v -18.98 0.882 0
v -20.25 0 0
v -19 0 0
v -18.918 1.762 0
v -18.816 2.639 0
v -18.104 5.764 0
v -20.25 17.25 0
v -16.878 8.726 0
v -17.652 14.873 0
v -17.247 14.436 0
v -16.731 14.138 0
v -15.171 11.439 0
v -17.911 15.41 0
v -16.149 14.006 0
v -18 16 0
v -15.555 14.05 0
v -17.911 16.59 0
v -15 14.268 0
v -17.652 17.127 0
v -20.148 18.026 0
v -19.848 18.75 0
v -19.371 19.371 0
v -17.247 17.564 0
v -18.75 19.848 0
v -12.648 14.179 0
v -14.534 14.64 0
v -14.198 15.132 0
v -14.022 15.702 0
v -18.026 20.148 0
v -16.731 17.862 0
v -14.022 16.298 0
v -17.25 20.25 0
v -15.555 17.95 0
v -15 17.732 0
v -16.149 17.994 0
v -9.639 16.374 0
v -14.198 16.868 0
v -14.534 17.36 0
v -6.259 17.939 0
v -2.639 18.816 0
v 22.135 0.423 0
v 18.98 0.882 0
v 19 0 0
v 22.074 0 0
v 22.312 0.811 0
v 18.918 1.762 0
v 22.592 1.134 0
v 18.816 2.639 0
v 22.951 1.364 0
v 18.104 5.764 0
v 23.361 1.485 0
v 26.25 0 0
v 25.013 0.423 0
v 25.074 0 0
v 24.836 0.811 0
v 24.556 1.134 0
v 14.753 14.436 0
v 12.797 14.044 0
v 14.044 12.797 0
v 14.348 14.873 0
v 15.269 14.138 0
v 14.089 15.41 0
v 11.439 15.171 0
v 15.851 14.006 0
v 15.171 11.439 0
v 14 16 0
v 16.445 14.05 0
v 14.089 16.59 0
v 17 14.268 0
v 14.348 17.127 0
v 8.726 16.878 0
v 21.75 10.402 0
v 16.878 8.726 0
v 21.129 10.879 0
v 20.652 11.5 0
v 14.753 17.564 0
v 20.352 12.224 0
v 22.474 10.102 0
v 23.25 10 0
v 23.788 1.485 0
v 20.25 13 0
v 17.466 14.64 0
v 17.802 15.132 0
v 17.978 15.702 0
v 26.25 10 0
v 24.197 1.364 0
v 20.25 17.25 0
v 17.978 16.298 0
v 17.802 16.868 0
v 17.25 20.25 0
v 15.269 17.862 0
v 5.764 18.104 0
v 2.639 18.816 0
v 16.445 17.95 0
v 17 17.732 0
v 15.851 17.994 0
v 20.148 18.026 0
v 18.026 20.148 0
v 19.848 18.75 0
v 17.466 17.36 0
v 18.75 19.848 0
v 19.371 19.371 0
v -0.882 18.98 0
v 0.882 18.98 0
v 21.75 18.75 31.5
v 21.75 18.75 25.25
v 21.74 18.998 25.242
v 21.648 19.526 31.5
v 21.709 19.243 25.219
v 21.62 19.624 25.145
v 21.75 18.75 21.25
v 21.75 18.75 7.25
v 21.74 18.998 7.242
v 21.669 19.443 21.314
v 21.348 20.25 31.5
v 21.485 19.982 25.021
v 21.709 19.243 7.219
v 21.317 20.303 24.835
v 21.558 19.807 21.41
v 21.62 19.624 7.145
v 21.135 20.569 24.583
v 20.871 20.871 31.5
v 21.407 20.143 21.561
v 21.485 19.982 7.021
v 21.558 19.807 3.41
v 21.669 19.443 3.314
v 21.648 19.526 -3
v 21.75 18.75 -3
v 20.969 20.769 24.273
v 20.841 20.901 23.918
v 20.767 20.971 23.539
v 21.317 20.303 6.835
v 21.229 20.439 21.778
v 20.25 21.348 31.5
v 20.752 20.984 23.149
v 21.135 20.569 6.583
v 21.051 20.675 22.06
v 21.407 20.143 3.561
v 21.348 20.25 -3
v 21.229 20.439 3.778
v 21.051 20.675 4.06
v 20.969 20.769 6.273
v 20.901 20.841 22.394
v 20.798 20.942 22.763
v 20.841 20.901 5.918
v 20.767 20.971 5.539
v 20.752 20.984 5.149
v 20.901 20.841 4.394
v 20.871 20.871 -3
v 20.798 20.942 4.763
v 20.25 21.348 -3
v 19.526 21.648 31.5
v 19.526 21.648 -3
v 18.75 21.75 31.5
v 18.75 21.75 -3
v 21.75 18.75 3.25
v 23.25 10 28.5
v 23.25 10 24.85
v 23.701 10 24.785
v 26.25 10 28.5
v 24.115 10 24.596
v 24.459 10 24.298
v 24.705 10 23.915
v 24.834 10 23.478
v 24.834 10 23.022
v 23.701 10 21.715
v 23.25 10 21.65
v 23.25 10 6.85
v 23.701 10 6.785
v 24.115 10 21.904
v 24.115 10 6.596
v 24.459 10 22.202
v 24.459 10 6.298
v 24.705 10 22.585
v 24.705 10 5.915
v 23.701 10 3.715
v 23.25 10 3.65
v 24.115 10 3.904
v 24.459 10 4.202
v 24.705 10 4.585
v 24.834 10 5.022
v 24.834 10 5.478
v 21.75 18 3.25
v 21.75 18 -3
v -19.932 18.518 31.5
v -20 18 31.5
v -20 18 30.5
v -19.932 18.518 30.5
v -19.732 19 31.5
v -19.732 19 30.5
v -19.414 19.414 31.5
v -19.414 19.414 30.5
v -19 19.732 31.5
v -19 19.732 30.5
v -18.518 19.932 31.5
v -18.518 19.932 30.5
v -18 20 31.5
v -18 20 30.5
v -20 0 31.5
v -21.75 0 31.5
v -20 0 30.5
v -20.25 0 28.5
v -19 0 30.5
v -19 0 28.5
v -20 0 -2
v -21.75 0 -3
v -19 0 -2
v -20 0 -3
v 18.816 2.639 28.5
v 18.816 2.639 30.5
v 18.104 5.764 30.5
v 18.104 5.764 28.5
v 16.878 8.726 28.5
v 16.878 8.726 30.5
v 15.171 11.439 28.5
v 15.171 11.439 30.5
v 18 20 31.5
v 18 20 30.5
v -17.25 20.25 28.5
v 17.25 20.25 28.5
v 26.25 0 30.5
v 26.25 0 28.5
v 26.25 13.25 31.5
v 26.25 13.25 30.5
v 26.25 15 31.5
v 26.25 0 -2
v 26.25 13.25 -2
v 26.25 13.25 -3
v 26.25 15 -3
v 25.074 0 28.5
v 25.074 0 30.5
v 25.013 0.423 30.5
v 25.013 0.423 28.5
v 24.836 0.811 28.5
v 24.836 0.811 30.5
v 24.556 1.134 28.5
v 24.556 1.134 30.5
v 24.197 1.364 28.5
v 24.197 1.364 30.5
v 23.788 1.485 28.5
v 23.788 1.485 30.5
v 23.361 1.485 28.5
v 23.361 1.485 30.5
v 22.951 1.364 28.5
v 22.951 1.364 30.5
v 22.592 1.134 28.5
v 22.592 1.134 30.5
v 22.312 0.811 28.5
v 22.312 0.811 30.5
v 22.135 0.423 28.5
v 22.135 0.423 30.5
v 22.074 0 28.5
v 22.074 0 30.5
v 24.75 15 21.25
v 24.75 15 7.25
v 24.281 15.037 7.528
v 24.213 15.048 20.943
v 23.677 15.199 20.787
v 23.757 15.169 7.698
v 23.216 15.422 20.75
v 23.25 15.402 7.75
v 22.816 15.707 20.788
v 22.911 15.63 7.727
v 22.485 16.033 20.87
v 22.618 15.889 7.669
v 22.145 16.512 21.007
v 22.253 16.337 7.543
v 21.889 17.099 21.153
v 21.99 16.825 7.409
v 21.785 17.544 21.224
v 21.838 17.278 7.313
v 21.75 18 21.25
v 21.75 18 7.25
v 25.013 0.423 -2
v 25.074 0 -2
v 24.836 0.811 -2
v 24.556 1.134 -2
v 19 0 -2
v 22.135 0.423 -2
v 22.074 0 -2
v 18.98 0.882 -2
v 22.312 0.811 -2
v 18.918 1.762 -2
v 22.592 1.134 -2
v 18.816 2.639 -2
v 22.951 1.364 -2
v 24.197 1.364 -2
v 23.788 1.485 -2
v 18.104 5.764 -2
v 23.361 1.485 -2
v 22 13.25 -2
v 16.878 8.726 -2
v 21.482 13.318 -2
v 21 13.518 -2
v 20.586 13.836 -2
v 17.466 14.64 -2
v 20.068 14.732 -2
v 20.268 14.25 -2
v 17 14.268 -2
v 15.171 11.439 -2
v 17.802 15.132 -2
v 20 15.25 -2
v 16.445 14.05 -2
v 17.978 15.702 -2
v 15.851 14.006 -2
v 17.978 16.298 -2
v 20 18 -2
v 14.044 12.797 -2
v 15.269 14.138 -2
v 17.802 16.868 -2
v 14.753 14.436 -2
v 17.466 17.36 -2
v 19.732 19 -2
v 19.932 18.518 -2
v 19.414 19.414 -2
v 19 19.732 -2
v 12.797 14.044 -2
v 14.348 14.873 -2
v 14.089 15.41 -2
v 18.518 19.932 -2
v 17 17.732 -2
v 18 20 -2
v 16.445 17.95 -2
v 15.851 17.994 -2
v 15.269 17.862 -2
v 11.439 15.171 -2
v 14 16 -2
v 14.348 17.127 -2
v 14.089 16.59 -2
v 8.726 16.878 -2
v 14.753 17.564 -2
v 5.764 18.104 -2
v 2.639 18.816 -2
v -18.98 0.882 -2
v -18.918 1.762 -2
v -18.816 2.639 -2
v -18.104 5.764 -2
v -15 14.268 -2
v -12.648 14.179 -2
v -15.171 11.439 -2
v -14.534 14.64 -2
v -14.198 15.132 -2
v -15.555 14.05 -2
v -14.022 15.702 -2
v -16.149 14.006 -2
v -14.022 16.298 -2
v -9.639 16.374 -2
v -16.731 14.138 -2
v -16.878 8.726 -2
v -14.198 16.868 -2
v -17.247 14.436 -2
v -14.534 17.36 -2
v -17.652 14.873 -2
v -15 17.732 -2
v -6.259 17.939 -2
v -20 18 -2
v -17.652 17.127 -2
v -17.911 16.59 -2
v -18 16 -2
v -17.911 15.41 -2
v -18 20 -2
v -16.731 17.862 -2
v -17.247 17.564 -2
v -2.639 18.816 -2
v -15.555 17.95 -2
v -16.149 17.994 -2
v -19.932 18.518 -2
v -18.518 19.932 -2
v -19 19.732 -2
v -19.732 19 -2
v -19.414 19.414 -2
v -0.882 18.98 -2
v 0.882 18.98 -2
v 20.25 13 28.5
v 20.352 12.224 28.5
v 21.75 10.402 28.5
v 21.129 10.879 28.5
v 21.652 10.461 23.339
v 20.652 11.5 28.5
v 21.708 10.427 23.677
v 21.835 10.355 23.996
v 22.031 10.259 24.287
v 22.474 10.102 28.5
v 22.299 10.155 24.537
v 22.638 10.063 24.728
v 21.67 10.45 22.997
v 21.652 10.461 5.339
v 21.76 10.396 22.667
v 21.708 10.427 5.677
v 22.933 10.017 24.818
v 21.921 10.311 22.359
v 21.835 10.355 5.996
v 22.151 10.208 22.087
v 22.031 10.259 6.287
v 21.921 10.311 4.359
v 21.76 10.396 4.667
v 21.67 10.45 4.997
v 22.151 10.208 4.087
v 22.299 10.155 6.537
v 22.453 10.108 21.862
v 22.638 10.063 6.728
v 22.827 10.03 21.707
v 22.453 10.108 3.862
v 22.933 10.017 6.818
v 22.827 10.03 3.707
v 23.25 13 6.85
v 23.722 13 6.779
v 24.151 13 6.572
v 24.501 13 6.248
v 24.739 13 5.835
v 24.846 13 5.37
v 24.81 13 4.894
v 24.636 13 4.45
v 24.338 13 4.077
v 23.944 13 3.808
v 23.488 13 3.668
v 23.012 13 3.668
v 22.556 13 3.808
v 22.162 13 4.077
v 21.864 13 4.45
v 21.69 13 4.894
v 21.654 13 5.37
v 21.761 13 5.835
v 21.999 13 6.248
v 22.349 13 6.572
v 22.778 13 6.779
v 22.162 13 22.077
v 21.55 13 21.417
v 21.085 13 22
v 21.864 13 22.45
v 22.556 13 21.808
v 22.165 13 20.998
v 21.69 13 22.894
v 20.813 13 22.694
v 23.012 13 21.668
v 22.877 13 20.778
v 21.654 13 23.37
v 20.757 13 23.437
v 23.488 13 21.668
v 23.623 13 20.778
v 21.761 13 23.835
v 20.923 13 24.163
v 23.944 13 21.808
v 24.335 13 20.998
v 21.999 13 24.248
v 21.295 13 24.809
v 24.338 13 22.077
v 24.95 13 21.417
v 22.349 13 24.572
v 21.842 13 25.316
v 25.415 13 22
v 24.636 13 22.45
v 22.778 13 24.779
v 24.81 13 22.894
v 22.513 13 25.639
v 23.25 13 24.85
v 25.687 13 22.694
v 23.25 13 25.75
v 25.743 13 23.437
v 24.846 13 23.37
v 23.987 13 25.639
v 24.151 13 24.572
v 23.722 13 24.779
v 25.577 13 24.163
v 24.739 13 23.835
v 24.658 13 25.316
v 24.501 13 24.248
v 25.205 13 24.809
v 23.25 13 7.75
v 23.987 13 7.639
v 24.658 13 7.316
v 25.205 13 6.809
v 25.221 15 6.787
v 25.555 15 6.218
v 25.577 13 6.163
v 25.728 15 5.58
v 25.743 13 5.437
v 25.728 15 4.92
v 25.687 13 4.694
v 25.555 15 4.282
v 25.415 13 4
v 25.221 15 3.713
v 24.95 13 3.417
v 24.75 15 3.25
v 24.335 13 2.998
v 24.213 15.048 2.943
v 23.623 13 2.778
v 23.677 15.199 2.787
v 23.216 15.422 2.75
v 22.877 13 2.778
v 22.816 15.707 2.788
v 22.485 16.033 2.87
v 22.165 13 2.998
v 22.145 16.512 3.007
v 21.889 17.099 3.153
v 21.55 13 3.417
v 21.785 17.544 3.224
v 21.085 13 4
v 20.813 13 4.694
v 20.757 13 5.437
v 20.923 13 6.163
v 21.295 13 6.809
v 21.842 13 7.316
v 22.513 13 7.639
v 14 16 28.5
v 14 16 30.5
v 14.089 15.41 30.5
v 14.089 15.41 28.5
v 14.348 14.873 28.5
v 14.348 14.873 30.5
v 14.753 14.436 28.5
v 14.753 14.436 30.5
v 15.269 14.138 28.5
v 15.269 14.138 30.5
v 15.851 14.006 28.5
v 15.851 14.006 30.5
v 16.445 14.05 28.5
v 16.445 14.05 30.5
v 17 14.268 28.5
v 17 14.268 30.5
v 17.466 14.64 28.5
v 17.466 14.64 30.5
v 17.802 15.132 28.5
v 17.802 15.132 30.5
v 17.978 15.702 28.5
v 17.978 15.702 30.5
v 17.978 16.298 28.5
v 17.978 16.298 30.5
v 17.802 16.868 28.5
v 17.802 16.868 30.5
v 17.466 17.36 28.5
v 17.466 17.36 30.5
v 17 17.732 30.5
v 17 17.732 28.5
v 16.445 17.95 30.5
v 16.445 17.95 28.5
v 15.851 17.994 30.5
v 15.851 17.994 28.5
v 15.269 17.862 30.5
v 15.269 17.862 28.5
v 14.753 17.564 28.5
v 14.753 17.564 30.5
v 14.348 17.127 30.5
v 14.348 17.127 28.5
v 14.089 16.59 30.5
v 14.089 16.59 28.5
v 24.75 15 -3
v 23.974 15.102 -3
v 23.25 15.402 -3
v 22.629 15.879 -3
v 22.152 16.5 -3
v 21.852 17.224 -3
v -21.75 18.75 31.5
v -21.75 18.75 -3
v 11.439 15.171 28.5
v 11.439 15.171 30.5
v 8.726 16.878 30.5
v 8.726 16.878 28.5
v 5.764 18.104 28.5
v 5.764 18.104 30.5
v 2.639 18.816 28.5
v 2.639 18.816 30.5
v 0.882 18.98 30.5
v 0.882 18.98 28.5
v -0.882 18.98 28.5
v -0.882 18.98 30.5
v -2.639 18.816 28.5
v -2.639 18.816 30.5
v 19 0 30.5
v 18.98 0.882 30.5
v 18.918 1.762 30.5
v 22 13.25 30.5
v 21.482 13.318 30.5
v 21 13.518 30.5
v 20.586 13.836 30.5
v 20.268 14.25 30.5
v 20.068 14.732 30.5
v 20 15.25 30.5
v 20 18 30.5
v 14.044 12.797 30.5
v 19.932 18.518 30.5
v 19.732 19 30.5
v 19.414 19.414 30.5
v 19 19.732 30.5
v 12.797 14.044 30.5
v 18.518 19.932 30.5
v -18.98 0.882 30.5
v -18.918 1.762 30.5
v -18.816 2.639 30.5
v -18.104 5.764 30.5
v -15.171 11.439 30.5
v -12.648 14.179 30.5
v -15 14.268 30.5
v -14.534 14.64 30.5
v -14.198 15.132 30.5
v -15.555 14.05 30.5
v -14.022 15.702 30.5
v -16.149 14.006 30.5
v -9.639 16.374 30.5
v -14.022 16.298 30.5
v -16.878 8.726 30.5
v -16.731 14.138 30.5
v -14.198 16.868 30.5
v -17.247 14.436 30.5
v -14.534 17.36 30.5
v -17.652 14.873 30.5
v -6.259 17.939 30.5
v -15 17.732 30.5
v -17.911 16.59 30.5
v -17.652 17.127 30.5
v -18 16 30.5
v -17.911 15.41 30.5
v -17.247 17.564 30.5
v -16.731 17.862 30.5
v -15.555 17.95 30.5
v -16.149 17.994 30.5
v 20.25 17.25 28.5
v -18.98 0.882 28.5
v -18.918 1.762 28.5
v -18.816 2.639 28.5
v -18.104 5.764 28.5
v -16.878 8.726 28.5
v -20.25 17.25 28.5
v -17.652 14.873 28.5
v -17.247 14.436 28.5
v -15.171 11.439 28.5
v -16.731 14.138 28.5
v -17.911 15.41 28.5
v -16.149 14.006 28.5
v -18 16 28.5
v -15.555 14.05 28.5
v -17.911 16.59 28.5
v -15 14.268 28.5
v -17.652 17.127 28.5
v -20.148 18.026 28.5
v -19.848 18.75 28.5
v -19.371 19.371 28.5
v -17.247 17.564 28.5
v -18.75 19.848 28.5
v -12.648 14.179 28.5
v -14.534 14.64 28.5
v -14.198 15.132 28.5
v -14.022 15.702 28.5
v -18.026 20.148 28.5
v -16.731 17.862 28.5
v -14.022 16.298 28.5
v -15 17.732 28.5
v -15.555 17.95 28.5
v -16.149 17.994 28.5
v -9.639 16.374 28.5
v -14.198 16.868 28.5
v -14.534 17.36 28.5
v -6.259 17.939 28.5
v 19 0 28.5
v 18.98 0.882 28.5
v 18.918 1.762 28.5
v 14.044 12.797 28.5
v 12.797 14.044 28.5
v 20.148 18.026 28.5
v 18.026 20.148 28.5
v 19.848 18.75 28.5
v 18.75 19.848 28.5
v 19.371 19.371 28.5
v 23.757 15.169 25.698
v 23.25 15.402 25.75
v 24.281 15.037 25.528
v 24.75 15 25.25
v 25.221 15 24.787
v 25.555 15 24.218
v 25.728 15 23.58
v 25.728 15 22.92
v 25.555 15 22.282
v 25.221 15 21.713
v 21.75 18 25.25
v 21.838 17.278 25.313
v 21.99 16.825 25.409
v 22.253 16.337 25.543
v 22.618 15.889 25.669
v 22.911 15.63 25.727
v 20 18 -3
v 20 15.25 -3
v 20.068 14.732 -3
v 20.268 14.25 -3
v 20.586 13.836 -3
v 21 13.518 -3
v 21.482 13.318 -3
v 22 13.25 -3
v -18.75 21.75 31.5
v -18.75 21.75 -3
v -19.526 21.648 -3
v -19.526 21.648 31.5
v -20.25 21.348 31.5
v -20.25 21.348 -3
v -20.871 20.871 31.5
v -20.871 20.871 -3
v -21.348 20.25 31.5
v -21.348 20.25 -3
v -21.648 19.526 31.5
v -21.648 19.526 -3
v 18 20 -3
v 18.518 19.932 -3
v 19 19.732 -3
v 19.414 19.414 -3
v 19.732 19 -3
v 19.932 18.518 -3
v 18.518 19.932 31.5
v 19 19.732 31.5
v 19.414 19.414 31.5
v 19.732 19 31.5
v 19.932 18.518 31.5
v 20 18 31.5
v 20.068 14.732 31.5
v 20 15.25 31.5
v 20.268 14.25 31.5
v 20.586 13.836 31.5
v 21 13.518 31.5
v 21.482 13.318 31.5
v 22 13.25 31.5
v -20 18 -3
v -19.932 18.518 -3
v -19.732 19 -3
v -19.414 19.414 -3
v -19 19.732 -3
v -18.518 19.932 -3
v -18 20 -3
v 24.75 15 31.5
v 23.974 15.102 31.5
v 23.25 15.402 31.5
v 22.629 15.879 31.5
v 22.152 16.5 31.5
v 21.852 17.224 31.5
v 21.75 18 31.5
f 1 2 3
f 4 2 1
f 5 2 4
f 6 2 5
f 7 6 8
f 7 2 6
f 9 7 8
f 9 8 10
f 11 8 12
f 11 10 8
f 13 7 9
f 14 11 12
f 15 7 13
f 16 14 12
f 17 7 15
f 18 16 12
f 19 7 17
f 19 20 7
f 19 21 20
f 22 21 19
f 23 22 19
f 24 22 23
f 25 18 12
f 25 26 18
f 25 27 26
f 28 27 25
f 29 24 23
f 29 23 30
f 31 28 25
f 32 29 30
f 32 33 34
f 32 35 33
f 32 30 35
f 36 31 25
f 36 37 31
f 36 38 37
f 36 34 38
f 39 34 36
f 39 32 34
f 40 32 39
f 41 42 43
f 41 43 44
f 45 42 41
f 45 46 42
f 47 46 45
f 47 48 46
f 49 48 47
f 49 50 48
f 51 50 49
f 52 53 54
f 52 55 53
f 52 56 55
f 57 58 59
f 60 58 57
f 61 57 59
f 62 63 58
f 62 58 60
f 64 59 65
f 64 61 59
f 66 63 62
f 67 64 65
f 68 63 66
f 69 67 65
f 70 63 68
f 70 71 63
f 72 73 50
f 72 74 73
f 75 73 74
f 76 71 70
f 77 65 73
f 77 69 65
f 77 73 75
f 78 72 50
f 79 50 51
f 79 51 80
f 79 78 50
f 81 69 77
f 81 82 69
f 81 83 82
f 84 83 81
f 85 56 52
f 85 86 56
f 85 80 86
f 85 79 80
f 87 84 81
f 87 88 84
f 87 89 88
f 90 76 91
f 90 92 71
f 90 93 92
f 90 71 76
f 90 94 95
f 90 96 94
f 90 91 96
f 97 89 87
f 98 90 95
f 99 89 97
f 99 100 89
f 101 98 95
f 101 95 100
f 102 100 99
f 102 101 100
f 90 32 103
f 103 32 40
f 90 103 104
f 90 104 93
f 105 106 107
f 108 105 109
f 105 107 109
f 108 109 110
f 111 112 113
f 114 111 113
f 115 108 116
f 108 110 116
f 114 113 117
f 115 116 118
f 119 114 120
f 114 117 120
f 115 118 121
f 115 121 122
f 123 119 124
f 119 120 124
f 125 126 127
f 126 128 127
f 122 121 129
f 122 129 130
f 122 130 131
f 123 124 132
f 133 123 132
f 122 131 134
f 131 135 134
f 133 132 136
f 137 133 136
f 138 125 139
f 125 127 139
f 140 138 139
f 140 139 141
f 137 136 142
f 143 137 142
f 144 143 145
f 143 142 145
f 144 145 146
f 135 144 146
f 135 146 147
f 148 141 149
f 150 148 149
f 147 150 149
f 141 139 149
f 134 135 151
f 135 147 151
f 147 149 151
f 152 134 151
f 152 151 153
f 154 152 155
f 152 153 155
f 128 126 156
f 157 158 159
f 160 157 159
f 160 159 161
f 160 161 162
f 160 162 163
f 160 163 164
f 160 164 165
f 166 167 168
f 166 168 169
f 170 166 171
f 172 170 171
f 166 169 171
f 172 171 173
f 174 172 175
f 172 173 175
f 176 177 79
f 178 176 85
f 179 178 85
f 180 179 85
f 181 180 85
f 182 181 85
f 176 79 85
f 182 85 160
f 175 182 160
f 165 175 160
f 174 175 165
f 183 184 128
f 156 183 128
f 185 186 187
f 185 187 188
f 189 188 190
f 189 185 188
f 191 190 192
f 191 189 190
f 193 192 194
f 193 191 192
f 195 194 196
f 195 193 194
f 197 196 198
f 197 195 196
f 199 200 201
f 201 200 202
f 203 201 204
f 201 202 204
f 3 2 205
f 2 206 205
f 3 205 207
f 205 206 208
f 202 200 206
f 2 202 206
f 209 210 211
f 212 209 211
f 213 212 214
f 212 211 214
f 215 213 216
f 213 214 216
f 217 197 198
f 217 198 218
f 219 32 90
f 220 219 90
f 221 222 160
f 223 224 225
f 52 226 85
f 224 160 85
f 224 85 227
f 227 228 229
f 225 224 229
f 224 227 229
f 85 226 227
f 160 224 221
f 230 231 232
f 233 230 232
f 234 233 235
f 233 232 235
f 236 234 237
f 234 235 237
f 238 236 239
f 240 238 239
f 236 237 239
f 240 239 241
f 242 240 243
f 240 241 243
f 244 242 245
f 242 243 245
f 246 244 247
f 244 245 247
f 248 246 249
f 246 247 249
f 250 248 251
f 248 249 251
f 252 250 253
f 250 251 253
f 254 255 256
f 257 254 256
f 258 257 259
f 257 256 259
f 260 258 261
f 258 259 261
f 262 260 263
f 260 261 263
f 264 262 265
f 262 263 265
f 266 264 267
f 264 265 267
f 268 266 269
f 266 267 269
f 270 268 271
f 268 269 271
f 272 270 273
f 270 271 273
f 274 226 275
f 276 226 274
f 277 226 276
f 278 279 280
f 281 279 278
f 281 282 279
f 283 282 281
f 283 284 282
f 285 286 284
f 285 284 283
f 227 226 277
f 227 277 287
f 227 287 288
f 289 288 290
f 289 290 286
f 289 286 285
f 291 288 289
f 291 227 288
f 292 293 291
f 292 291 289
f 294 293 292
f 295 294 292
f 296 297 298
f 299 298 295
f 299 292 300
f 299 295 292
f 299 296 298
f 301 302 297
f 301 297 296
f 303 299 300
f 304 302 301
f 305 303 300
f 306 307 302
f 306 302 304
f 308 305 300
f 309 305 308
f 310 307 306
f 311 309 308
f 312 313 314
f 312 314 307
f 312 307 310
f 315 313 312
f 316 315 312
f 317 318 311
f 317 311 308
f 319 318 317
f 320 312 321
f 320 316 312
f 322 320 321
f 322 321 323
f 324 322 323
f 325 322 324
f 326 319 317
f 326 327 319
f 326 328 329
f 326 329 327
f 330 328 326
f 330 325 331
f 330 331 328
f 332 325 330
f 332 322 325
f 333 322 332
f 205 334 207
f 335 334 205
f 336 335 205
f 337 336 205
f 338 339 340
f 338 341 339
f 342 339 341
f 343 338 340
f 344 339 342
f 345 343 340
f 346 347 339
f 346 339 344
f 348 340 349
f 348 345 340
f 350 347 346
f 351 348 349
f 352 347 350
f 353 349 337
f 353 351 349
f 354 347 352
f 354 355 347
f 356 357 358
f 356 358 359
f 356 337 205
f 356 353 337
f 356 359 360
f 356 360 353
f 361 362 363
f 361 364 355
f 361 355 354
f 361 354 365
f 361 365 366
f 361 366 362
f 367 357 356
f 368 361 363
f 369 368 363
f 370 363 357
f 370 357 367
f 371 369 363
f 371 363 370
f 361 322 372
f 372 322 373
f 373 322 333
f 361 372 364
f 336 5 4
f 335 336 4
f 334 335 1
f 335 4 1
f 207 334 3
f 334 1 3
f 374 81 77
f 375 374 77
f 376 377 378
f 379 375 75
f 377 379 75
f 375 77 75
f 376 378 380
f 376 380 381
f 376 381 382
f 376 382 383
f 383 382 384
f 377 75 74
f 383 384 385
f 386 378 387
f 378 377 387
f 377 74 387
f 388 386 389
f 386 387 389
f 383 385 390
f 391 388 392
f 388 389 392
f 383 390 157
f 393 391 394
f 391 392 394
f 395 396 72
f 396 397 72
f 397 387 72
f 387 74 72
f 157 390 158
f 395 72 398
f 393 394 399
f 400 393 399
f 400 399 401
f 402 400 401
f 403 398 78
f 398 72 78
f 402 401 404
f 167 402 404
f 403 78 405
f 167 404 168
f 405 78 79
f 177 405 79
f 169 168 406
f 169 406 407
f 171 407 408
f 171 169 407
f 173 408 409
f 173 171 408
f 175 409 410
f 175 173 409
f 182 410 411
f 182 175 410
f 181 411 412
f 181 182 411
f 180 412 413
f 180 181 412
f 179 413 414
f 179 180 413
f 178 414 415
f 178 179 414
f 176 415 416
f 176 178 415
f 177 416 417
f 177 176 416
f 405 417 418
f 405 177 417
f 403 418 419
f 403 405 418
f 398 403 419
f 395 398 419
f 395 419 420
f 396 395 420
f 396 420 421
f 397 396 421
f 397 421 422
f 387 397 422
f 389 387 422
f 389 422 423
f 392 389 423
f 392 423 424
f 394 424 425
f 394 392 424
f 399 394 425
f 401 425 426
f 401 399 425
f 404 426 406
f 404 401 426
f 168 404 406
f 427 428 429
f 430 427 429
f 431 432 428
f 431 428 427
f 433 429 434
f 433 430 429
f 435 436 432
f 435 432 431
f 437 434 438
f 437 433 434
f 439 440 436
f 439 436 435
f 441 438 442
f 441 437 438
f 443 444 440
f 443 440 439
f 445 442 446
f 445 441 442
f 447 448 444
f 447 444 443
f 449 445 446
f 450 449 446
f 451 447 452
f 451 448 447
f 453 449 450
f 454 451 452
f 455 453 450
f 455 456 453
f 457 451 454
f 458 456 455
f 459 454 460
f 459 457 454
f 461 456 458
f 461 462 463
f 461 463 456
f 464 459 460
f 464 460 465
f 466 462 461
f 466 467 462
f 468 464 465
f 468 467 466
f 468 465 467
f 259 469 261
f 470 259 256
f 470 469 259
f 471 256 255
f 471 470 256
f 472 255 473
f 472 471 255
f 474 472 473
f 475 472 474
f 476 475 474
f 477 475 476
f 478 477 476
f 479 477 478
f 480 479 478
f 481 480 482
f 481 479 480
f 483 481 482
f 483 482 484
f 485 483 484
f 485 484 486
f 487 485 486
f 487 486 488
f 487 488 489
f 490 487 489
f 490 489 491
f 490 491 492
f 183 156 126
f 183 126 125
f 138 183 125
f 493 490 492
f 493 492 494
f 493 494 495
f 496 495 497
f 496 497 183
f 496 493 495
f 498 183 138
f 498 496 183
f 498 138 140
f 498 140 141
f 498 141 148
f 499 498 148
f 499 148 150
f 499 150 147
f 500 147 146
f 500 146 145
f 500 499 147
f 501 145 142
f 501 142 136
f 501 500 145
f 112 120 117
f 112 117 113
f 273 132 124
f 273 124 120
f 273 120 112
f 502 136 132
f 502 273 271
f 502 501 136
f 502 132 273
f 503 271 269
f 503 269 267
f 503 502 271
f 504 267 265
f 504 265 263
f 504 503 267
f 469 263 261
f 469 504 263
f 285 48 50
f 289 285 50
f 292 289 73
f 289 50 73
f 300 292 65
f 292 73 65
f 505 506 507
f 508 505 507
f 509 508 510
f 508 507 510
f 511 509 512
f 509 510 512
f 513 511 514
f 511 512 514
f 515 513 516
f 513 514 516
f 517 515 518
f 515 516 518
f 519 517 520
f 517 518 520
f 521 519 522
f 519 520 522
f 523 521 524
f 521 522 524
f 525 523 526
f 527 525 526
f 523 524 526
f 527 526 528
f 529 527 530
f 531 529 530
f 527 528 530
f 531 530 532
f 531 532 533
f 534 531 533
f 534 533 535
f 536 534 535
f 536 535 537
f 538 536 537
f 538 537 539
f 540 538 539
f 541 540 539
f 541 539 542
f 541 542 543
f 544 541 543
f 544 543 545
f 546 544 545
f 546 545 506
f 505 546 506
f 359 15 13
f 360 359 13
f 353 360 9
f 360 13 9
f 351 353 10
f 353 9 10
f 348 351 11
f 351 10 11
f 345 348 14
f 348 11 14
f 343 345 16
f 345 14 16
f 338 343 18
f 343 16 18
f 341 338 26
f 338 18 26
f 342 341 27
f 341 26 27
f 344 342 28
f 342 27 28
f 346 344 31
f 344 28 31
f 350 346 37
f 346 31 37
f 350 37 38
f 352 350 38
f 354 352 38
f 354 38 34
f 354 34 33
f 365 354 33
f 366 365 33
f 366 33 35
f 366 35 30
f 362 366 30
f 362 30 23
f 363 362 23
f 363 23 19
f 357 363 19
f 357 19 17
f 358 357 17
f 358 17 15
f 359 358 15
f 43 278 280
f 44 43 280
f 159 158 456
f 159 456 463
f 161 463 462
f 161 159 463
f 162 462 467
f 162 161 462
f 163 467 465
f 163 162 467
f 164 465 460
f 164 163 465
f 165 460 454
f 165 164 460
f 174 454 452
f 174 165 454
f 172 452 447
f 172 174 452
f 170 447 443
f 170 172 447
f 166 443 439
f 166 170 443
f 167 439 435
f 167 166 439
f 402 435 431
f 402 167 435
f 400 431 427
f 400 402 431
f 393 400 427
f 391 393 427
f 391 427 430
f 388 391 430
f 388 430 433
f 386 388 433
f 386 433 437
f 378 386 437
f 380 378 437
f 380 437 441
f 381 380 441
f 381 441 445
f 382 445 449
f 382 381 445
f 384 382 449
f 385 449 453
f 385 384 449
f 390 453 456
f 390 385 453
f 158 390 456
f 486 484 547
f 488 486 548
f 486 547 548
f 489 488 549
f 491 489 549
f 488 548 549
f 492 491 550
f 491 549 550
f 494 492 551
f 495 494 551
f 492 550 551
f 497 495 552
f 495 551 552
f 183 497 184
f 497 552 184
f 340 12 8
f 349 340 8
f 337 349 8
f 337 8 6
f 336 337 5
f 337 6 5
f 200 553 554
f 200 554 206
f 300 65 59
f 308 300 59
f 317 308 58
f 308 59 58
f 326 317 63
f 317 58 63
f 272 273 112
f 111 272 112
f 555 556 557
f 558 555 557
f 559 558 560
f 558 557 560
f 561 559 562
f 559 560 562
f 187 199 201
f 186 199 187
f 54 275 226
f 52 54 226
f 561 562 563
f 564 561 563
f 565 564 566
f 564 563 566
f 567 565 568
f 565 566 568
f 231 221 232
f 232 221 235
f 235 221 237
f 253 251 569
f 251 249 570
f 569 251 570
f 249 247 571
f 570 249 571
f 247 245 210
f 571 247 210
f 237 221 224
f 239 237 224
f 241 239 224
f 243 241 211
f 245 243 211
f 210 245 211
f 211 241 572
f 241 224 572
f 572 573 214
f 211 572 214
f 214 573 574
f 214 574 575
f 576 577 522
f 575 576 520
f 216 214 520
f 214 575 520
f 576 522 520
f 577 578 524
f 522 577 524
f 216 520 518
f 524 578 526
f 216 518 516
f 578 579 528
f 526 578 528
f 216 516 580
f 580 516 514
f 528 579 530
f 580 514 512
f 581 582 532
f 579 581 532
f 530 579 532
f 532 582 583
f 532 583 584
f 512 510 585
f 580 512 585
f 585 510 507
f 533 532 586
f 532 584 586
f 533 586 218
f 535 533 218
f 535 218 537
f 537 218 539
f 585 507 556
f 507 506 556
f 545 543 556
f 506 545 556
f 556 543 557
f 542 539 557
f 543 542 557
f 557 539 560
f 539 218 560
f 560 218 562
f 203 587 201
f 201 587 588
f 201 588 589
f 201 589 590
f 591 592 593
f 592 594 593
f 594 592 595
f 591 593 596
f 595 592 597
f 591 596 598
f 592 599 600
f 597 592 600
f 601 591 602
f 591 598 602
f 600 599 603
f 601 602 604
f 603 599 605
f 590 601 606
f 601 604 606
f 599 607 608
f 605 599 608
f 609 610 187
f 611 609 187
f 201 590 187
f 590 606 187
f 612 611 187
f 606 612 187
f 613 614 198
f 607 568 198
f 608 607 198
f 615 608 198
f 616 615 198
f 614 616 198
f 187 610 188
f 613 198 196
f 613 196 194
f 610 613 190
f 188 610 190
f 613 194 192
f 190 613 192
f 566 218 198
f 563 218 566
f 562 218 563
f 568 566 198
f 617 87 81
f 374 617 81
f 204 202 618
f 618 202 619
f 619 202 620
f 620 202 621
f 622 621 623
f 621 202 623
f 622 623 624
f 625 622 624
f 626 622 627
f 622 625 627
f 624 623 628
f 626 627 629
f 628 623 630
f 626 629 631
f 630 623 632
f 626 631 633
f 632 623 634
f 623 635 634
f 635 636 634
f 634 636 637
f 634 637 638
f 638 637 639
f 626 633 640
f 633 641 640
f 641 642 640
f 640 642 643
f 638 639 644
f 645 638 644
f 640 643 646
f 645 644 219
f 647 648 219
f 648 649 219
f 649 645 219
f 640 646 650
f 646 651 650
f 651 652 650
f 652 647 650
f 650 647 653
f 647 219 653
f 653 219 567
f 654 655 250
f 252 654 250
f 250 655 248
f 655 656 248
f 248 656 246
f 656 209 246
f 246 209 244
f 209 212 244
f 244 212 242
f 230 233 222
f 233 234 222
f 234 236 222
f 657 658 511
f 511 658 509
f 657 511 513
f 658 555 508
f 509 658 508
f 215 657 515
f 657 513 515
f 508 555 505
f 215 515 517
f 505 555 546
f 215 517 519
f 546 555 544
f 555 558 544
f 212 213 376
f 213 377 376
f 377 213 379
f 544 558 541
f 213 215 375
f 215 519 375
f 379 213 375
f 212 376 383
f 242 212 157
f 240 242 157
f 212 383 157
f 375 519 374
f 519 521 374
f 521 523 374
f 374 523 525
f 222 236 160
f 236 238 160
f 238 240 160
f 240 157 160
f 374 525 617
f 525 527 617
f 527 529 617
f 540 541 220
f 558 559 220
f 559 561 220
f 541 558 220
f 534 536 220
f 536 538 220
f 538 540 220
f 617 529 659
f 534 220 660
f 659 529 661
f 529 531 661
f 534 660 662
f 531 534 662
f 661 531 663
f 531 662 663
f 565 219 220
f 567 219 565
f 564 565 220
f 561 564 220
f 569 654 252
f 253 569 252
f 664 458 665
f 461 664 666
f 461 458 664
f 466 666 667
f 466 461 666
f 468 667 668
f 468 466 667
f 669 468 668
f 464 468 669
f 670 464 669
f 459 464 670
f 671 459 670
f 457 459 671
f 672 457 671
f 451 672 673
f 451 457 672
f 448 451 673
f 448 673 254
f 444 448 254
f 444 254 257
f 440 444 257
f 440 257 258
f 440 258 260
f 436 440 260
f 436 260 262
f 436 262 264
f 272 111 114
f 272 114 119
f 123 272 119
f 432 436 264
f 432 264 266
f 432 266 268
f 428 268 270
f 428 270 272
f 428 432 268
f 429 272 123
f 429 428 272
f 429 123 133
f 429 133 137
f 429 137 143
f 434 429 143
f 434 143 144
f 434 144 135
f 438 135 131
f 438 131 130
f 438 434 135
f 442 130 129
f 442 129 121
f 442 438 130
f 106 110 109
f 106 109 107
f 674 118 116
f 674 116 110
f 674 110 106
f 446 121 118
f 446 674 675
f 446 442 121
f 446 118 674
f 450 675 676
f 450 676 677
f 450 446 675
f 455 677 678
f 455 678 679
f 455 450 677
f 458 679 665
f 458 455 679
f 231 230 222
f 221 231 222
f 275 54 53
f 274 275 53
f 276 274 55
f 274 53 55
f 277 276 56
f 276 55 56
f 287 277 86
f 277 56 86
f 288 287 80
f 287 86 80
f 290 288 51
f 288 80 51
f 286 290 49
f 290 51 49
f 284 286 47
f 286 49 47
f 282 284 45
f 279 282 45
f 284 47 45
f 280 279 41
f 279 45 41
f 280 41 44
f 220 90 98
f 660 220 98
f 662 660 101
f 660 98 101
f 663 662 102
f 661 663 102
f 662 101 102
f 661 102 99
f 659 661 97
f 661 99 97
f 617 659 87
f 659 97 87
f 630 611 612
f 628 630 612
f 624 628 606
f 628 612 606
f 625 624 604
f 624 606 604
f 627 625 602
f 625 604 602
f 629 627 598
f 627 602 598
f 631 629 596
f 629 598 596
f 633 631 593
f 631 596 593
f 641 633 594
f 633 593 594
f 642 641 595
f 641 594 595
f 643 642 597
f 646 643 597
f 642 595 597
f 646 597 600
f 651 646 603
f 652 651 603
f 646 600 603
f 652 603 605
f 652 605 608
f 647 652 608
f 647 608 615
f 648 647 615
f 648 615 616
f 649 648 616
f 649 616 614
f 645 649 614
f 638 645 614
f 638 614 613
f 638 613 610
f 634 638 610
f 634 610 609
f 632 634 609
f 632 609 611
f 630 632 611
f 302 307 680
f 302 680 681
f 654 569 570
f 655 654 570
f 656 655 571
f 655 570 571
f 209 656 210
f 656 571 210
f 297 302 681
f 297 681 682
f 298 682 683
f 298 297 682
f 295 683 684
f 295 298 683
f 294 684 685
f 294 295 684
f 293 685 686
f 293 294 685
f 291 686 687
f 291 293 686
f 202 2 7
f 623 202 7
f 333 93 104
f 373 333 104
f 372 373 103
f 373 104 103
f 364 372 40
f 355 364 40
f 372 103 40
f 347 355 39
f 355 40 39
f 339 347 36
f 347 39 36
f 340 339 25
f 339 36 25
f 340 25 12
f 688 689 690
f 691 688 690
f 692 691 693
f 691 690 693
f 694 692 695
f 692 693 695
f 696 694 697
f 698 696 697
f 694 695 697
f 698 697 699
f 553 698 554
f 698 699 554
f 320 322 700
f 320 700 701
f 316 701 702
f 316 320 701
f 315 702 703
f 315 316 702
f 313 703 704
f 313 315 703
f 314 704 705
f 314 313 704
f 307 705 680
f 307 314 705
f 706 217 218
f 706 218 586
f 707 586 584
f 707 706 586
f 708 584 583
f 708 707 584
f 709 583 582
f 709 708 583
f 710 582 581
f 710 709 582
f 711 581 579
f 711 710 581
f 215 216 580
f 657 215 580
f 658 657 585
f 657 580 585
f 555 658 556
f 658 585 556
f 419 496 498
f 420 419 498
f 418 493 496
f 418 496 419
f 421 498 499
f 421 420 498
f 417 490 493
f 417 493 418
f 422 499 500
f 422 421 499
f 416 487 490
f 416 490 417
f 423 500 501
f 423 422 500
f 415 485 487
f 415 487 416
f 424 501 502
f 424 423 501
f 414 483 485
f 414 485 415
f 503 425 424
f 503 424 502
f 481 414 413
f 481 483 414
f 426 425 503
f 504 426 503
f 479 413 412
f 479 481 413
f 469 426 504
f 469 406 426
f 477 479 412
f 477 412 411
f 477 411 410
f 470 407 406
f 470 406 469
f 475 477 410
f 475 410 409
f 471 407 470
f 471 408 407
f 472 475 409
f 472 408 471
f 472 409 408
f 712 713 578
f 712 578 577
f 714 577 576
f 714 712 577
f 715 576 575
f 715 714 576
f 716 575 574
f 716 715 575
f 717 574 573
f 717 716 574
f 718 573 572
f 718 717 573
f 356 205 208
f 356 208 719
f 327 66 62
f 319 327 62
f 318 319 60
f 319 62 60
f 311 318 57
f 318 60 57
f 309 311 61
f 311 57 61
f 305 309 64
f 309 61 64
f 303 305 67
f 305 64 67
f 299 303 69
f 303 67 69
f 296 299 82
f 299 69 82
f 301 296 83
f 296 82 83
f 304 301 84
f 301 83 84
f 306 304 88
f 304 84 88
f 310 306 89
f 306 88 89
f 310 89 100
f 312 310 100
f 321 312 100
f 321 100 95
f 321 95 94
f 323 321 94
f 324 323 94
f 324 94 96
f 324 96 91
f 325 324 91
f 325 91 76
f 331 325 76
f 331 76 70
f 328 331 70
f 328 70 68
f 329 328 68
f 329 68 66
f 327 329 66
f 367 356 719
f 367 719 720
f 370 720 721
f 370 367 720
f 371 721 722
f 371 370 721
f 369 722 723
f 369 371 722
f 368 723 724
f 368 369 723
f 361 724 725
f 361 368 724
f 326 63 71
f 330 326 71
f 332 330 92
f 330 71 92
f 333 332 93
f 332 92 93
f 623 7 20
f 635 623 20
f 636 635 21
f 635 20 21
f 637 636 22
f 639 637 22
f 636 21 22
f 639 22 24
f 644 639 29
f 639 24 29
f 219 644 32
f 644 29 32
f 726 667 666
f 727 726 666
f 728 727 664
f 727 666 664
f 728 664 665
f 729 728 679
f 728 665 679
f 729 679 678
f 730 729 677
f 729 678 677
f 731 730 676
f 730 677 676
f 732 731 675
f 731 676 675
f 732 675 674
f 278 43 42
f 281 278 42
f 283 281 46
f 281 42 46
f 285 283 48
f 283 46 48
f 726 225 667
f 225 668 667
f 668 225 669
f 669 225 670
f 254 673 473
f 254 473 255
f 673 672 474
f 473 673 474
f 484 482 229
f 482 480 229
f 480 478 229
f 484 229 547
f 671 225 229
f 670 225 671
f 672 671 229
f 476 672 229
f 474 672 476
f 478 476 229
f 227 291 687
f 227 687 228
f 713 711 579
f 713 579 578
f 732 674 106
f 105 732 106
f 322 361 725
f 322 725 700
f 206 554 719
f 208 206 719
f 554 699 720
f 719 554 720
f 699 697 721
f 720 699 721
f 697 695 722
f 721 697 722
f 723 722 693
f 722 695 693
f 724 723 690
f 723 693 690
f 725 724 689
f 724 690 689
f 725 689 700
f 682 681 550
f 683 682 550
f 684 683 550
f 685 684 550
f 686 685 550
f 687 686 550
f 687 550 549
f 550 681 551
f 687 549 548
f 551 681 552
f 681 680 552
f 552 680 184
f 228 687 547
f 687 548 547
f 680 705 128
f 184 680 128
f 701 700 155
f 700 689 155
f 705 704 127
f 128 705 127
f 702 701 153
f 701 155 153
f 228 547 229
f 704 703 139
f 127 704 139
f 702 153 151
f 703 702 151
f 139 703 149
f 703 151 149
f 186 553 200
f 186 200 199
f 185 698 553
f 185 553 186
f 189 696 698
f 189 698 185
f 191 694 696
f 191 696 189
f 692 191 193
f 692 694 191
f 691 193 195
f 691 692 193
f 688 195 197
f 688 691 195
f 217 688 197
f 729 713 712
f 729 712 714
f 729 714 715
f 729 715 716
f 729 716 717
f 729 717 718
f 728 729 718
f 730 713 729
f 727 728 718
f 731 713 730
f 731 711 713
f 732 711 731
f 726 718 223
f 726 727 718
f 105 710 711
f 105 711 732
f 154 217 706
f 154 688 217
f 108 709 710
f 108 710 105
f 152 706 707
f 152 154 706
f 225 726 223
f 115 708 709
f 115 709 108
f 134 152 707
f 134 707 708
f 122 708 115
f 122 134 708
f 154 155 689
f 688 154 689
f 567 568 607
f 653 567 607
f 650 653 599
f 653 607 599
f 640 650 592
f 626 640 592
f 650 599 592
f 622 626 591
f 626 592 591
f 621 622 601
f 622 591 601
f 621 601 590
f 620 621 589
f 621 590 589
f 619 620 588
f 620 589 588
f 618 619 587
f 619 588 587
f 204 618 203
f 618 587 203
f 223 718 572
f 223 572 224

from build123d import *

# Parameters (mm, degrees)
EXTRUDE_1_DEPTH          = 28.5
EXTRUDE_2_DEPTH          = 3
EXTRUDE_START            = 3
EXTRUDE_3_DEPTH          = 3
CUT_EXTRUDE_1_DEPTH      = 1
CUT_EXTRUDE_START        = -1
CUT_EXTRUDE_2_DEPTH      = 1
SKETCH_6_R               = 2
CUT_EXTRUDE_3_DEPTH      = 33
CUT_EXTRUDE_5_DEPTH      = 6
CUT_EXTRUDE_5_DEPTH_BACK = 6
SKETCH_7_R               = 1.6
CUT_EXTRUDE_6_DEPTH      = 6
CUT_EXTRUDE_6_DEPTH_BACK = 2
SKETCH_8_R               = 2.5
CUT_EXTRUDE_START_2      = 30.5
CUT_EXTRUDE_7_DEPTH      = 32.5


with BuildPart() as part:
    # 草图1 → 凸台-拉伸1 (new body)
    with BuildSketch(Plane.XY):
        with BuildLine():
            Line((-20.25, 0), (-20.25, 17.25))
            ThreePointArc((-20.25, 17.25), (-19.371320344, 19.371320344), (-17.25, 20.25))
            Line((-17.25, 20.25), (17.25, 20.25))
            ThreePointArc((17.25, 20.25), (19.371320344, 19.371320344), (20.25, 17.25))
            Line((20.25, 17.25), (20.25, 13))
            ThreePointArc((20.25, 13), (21.128679656, 10.878679656), (23.25, 10))
            Line((23.25, 10), (26.25, 10))
            Line((26.25, 10), (26.25, 15))
            Line((26.25, 15), (24.75, 15))
            ThreePointArc((24.75, 15), (22.628679656, 15.878679656), (21.75, 18))
            Line((21.75, 18), (21.75, 18.75))
            ThreePointArc((21.75, 18.75), (20.871320344, 20.871320344), (18.75, 21.75))
            Line((18.75, 21.75), (0, 21.75))
            Line((0, 21.75), (-18.75, 21.75))
            ThreePointArc((-18.75, 21.75), (-20.871320344, 20.871320344), (-21.75, 18.75))
            Line((-21.75, 18.75), (-21.75, 0))
            Line((-21.75, 0), (-20.25, 0))
        make_face()
    extrude(amount=EXTRUDE_1_DEPTH)

    # 草图2 → 凸台-拉伸2 (add)
    with BuildSketch(Plane.XY.offset(28.5)):
        with BuildLine():
            Line((-21.75, 0), (26.25, 0))
            Line((26.25, 0), (26.25, 15))
            Line((26.25, 15), (24.75, 15))
            ThreePointArc((24.75, 15), (22.628679656, 15.878679656), (21.75, 18))
            Line((21.75, 18), (21.75, 18.75))
            ThreePointArc((21.75, 18.75), (20.871320344, 20.871320344), (18.75, 21.75))
            Line((18.75, 21.75), (-18.75, 21.75))
            ThreePointArc((-18.75, 21.75), (-20.871320344, 20.871320344), (-21.75, 18.75))
            Line((-21.75, 18.75), (-21.75, 0))
        make_face()
    extrude(amount=EXTRUDE_2_DEPTH)

    # 草图3 → 凸台-拉伸3 (add)
    with BuildSketch(Plane(origin=(0, 0, 0), x_dir=(-1, 0, 0), z_dir=(0, 0, -1)).offset(EXTRUDE_START)):
        with BuildLine():
            Line((21.75, 0), (-26.25, 0))
            Line((-26.25, 0), (-26.25, 15))
            Line((-26.25, 15), (-24.75, 15))
            ThreePointArc((-24.75, 15), (-22.628679656, 15.878679656), (-21.75, 18))
            Line((-21.75, 18), (-21.75, 18.75))
            ThreePointArc((-21.75, 18.75), (-20.871320344, 20.871320344), (-18.75, 21.75))
            Line((-18.75, 21.75), (18.75, 21.75))
            ThreePointArc((18.75, 21.75), (20.871320344, 20.871320344), (21.75, 18.75))
            Line((21.75, 18.75), (21.75, 0))
        make_face()
    extrude(amount=-EXTRUDE_3_DEPTH)

    # 草图4 → 切除-拉伸1 (cut)
    with BuildSketch(Plane.XY.offset(31.5)):
        with BuildLine():
            Line((26.25, 13.25), (26.25, 0))
            Line((26.25, 0), (-20, 0))
            Line((-20, 0), (-20, 18))
            ThreePointArc((-20, 18), (-19.414213562, 19.414213562), (-18, 20))
            Line((-18, 20), (18, 20))
            ThreePointArc((18, 20), (19.414213562, 19.414213562), (20, 18))
            Line((20, 18), (20, 15.25))
            ThreePointArc((20, 15.25), (20.585786438, 13.835786438), (22, 13.25))
            Line((22, 13.25), (26.25, 13.25))
        make_face()
    extrude(amount=-CUT_EXTRUDE_1_DEPTH, mode=Mode.SUBTRACT)

    # 草图5 → 切除-拉伸2 (cut)
    with BuildSketch(Plane(origin=(0, 0, -3), x_dir=(-1, 0, 0), z_dir=(0, 0, -1)).offset(CUT_EXTRUDE_START)):
        with BuildLine():
            Line((0, 0), (20, 0))
            Line((20, 0), (20, 18))
            ThreePointArc((20, 18), (19.414213562, 19.414213562), (18, 20))
            Line((18, 20), (-18, 20))
            ThreePointArc((-18, 20), (-19.414213562, 19.414213562), (-20, 18))
            Line((-20, 18), (-20, 15.25))
            ThreePointArc((-20, 15.25), (-20.585786438, 13.835786438), (-22, 13.25))
            Line((-22, 13.25), (-26.25, 13.25))
            Line((-26.25, 13.25), (-26.25, 0))
            Line((-26.25, 0), (0, 0))
        make_face()
    extrude(amount=CUT_EXTRUDE_2_DEPTH, mode=Mode.SUBTRACT)

    # 草图6 → 切除-拉伸3 (cut)
    with BuildSketch(Plane.XY.offset(30.5)):
        with Locations(Location((-16, 16, 0), (0, 0, 180))):
            Circle(SKETCH_6_R)
        with Locations(Location((16, 16, 0), (0, 0, 180))):
            Circle(SKETCH_6_R)
        with BuildLine():
            Line((22.074047969, 0), (25.074047969, 0))
            ThreePointArc((25.074047969, 0), (23.574047969, 1.5), (22.074047969, 0))
        make_face()
        with BuildLine():
            Line((-11.543902494, 13.665222838), (-5.052849459, 7.174169802))
            ThreePointArc((-5.052849459, 7.174169802), (-4.48601855, 6.891164125), (-3.86288238, 7.005579185))
            ThreePointArc((-3.86288238, 7.005579185), (-3.061467459, 7.39103626), (-2.222222222, 7.685162874))
            ThreePointArc((-2.222222222, 7.685162874), (-1.700694746, 8.04488302), (-1.5, 8.645808233))
            Line((-1.5, 8.645808233), (-1.5, 17.82554347))
            ThreePointArc((-1.5, 17.82554347), (-1.843832677, 18.580158898), (-2.638888889, 18.815851441))
            ThreePointArc((-2.638888889, 18.815851441), (-7.270985215, 17.553711118), (-11.438839919, 15.170792376))
            ThreePointArc((-11.438839919, 15.170792376), (-11.834369763, 14.441942942), (-11.543902494, 13.665222838))
        make_face()
        with BuildLine():
            Line((1.5, 17.82554347), (1.5, 8.645808233))
            ThreePointArc((1.5, 8.645808233), (1.700694746, 8.04488302), (2.222222222, 7.685162874))
            ThreePointArc((2.222222222, 7.685162874), (3.061467459, 7.39103626), (3.86288238, 7.005579185))
            ThreePointArc((3.86288238, 7.005579185), (4.48601855, 6.891164125), (5.052849459, 7.174169802))
            Line((5.052849459, 7.174169802), (11.543902494, 13.665222838))
            ThreePointArc((11.543902494, 13.665222838), (11.834369763, 14.441942942), (11.438839919, 15.170792376))
            ThreePointArc((11.438839919, 15.170792376), (7.270985215, 17.553711118), (2.638888889, 18.815851441))
            ThreePointArc((2.638888889, 18.815851441), (1.843832677, 18.580158898), (1.5, 17.82554347))
        make_face()
        with BuildLine():
            Line((13.665222838, 11.543902494), (7.174169802, 5.052849459))
            ThreePointArc((7.174169802, 5.052849459), (6.891164125, 4.48601855), (7.005579185, 3.86288238))
            ThreePointArc((7.005579185, 3.86288238), (7.39103626, 3.061467459), (7.685162874, 2.222222222))
            ThreePointArc((7.685162874, 2.222222222), (8.04488302, 1.700694746), (8.645808233, 1.5))
            Line((8.645808233, 1.5), (17.82554347, 1.5))
            ThreePointArc((17.82554347, 1.5), (18.580158898, 1.843832677), (18.815851441, 2.638888889))
            ThreePointArc((18.815851441, 2.638888889), (17.553711118, 7.270985215), (15.170792376, 11.438839919))
            ThreePointArc((15.170792376, 11.438839919), (14.441942942, 11.834369763), (13.665222838, 11.543902494))
        make_face()
        with BuildLine():
            Line((-4, 0), (4, 0))
            ThreePointArc((4, 0), (0, 4), (-4, 0))
        make_face()
        with BuildLine():
            Line((-17.82554347, 1.5), (-8.645808233, 1.5))
            ThreePointArc((-8.645808233, 1.5), (-8.04488302, 1.700694746), (-7.685162874, 2.222222222))
            ThreePointArc((-7.685162874, 2.222222222), (-7.39103626, 3.061467459), (-7.005579185, 3.86288238))
            ThreePointArc((-7.005579185, 3.86288238), (-6.891164125, 4.48601855), (-7.174169802, 5.052849459))
            Line((-7.174169802, 5.052849459), (-13.665222838, 11.543902494))
            ThreePointArc((-13.665222838, 11.543902494), (-14.441942942, 11.834369763), (-15.170792376, 11.438839919))
            ThreePointArc((-15.170792376, 11.438839919), (-17.553711118, 7.270985215), (-18.815851441, 2.638888889))
            ThreePointArc((-18.815851441, 2.638888889), (-18.580158898, 1.843832677), (-17.82554347, 1.5))
        make_face()
    extrude(amount=-CUT_EXTRUDE_3_DEPTH, mode=Mode.SUBTRACT)

    # 草图7 → 切除-拉伸5 (cut, two sides: drawn at the far end of the back side and taken through both)
    with BuildSketch(Plane(origin=(0, 15, 0), x_dir=(1, 0, 0), z_dir=(0, 1, 0)).offset(-CUT_EXTRUDE_5_DEPTH_BACK)):
        with Locations(Location((23.25, -5.25, 0), (0, 0, 270))):
            Circle(SKETCH_7_R)
        with Locations(Location((23.25, -23.25, 0), (0, 0, 270))):
            Circle(SKETCH_7_R)
    extrude(amount=CUT_EXTRUDE_5_DEPTH + CUT_EXTRUDE_5_DEPTH_BACK, mode=Mode.SUBTRACT)

    # 草图8 → 切除-拉伸6 (cut, two sides: drawn at the far end of the back side and taken through both)
    with BuildSketch(Plane(origin=(0, 15, 0), x_dir=(1, 0, 0), z_dir=(0, 1, 0)).offset(-CUT_EXTRUDE_6_DEPTH_BACK)):
        with Locations(Location((23.25, -5.25, 0), (0, 0, 270))):
            Circle(SKETCH_8_R)
        with Locations(Location((23.25, -23.25, 0), (0, 0, 270))):
            Circle(SKETCH_8_R)
    extrude(amount=CUT_EXTRUDE_6_DEPTH + CUT_EXTRUDE_6_DEPTH_BACK, mode=Mode.SUBTRACT)

    # 草图9 → 切除-拉伸7 (cut)
    with BuildSketch(Plane.XY.offset(CUT_EXTRUDE_START_2)):
        with BuildLine():
            Line((-19, 0), (19, 0))
            ThreePointArc((19, 0), (3.706716118, 18.634920328), (-17.553711118, 7.270985215))
            ThreePointArc((-17.553711118, 7.270985215), (-18.634920328, 3.706716118), (-19, 0))
        make_face()
    extrude(amount=-CUT_EXTRUDE_7_DEPTH, mode=Mode.SUBTRACT)


solid = part.part
